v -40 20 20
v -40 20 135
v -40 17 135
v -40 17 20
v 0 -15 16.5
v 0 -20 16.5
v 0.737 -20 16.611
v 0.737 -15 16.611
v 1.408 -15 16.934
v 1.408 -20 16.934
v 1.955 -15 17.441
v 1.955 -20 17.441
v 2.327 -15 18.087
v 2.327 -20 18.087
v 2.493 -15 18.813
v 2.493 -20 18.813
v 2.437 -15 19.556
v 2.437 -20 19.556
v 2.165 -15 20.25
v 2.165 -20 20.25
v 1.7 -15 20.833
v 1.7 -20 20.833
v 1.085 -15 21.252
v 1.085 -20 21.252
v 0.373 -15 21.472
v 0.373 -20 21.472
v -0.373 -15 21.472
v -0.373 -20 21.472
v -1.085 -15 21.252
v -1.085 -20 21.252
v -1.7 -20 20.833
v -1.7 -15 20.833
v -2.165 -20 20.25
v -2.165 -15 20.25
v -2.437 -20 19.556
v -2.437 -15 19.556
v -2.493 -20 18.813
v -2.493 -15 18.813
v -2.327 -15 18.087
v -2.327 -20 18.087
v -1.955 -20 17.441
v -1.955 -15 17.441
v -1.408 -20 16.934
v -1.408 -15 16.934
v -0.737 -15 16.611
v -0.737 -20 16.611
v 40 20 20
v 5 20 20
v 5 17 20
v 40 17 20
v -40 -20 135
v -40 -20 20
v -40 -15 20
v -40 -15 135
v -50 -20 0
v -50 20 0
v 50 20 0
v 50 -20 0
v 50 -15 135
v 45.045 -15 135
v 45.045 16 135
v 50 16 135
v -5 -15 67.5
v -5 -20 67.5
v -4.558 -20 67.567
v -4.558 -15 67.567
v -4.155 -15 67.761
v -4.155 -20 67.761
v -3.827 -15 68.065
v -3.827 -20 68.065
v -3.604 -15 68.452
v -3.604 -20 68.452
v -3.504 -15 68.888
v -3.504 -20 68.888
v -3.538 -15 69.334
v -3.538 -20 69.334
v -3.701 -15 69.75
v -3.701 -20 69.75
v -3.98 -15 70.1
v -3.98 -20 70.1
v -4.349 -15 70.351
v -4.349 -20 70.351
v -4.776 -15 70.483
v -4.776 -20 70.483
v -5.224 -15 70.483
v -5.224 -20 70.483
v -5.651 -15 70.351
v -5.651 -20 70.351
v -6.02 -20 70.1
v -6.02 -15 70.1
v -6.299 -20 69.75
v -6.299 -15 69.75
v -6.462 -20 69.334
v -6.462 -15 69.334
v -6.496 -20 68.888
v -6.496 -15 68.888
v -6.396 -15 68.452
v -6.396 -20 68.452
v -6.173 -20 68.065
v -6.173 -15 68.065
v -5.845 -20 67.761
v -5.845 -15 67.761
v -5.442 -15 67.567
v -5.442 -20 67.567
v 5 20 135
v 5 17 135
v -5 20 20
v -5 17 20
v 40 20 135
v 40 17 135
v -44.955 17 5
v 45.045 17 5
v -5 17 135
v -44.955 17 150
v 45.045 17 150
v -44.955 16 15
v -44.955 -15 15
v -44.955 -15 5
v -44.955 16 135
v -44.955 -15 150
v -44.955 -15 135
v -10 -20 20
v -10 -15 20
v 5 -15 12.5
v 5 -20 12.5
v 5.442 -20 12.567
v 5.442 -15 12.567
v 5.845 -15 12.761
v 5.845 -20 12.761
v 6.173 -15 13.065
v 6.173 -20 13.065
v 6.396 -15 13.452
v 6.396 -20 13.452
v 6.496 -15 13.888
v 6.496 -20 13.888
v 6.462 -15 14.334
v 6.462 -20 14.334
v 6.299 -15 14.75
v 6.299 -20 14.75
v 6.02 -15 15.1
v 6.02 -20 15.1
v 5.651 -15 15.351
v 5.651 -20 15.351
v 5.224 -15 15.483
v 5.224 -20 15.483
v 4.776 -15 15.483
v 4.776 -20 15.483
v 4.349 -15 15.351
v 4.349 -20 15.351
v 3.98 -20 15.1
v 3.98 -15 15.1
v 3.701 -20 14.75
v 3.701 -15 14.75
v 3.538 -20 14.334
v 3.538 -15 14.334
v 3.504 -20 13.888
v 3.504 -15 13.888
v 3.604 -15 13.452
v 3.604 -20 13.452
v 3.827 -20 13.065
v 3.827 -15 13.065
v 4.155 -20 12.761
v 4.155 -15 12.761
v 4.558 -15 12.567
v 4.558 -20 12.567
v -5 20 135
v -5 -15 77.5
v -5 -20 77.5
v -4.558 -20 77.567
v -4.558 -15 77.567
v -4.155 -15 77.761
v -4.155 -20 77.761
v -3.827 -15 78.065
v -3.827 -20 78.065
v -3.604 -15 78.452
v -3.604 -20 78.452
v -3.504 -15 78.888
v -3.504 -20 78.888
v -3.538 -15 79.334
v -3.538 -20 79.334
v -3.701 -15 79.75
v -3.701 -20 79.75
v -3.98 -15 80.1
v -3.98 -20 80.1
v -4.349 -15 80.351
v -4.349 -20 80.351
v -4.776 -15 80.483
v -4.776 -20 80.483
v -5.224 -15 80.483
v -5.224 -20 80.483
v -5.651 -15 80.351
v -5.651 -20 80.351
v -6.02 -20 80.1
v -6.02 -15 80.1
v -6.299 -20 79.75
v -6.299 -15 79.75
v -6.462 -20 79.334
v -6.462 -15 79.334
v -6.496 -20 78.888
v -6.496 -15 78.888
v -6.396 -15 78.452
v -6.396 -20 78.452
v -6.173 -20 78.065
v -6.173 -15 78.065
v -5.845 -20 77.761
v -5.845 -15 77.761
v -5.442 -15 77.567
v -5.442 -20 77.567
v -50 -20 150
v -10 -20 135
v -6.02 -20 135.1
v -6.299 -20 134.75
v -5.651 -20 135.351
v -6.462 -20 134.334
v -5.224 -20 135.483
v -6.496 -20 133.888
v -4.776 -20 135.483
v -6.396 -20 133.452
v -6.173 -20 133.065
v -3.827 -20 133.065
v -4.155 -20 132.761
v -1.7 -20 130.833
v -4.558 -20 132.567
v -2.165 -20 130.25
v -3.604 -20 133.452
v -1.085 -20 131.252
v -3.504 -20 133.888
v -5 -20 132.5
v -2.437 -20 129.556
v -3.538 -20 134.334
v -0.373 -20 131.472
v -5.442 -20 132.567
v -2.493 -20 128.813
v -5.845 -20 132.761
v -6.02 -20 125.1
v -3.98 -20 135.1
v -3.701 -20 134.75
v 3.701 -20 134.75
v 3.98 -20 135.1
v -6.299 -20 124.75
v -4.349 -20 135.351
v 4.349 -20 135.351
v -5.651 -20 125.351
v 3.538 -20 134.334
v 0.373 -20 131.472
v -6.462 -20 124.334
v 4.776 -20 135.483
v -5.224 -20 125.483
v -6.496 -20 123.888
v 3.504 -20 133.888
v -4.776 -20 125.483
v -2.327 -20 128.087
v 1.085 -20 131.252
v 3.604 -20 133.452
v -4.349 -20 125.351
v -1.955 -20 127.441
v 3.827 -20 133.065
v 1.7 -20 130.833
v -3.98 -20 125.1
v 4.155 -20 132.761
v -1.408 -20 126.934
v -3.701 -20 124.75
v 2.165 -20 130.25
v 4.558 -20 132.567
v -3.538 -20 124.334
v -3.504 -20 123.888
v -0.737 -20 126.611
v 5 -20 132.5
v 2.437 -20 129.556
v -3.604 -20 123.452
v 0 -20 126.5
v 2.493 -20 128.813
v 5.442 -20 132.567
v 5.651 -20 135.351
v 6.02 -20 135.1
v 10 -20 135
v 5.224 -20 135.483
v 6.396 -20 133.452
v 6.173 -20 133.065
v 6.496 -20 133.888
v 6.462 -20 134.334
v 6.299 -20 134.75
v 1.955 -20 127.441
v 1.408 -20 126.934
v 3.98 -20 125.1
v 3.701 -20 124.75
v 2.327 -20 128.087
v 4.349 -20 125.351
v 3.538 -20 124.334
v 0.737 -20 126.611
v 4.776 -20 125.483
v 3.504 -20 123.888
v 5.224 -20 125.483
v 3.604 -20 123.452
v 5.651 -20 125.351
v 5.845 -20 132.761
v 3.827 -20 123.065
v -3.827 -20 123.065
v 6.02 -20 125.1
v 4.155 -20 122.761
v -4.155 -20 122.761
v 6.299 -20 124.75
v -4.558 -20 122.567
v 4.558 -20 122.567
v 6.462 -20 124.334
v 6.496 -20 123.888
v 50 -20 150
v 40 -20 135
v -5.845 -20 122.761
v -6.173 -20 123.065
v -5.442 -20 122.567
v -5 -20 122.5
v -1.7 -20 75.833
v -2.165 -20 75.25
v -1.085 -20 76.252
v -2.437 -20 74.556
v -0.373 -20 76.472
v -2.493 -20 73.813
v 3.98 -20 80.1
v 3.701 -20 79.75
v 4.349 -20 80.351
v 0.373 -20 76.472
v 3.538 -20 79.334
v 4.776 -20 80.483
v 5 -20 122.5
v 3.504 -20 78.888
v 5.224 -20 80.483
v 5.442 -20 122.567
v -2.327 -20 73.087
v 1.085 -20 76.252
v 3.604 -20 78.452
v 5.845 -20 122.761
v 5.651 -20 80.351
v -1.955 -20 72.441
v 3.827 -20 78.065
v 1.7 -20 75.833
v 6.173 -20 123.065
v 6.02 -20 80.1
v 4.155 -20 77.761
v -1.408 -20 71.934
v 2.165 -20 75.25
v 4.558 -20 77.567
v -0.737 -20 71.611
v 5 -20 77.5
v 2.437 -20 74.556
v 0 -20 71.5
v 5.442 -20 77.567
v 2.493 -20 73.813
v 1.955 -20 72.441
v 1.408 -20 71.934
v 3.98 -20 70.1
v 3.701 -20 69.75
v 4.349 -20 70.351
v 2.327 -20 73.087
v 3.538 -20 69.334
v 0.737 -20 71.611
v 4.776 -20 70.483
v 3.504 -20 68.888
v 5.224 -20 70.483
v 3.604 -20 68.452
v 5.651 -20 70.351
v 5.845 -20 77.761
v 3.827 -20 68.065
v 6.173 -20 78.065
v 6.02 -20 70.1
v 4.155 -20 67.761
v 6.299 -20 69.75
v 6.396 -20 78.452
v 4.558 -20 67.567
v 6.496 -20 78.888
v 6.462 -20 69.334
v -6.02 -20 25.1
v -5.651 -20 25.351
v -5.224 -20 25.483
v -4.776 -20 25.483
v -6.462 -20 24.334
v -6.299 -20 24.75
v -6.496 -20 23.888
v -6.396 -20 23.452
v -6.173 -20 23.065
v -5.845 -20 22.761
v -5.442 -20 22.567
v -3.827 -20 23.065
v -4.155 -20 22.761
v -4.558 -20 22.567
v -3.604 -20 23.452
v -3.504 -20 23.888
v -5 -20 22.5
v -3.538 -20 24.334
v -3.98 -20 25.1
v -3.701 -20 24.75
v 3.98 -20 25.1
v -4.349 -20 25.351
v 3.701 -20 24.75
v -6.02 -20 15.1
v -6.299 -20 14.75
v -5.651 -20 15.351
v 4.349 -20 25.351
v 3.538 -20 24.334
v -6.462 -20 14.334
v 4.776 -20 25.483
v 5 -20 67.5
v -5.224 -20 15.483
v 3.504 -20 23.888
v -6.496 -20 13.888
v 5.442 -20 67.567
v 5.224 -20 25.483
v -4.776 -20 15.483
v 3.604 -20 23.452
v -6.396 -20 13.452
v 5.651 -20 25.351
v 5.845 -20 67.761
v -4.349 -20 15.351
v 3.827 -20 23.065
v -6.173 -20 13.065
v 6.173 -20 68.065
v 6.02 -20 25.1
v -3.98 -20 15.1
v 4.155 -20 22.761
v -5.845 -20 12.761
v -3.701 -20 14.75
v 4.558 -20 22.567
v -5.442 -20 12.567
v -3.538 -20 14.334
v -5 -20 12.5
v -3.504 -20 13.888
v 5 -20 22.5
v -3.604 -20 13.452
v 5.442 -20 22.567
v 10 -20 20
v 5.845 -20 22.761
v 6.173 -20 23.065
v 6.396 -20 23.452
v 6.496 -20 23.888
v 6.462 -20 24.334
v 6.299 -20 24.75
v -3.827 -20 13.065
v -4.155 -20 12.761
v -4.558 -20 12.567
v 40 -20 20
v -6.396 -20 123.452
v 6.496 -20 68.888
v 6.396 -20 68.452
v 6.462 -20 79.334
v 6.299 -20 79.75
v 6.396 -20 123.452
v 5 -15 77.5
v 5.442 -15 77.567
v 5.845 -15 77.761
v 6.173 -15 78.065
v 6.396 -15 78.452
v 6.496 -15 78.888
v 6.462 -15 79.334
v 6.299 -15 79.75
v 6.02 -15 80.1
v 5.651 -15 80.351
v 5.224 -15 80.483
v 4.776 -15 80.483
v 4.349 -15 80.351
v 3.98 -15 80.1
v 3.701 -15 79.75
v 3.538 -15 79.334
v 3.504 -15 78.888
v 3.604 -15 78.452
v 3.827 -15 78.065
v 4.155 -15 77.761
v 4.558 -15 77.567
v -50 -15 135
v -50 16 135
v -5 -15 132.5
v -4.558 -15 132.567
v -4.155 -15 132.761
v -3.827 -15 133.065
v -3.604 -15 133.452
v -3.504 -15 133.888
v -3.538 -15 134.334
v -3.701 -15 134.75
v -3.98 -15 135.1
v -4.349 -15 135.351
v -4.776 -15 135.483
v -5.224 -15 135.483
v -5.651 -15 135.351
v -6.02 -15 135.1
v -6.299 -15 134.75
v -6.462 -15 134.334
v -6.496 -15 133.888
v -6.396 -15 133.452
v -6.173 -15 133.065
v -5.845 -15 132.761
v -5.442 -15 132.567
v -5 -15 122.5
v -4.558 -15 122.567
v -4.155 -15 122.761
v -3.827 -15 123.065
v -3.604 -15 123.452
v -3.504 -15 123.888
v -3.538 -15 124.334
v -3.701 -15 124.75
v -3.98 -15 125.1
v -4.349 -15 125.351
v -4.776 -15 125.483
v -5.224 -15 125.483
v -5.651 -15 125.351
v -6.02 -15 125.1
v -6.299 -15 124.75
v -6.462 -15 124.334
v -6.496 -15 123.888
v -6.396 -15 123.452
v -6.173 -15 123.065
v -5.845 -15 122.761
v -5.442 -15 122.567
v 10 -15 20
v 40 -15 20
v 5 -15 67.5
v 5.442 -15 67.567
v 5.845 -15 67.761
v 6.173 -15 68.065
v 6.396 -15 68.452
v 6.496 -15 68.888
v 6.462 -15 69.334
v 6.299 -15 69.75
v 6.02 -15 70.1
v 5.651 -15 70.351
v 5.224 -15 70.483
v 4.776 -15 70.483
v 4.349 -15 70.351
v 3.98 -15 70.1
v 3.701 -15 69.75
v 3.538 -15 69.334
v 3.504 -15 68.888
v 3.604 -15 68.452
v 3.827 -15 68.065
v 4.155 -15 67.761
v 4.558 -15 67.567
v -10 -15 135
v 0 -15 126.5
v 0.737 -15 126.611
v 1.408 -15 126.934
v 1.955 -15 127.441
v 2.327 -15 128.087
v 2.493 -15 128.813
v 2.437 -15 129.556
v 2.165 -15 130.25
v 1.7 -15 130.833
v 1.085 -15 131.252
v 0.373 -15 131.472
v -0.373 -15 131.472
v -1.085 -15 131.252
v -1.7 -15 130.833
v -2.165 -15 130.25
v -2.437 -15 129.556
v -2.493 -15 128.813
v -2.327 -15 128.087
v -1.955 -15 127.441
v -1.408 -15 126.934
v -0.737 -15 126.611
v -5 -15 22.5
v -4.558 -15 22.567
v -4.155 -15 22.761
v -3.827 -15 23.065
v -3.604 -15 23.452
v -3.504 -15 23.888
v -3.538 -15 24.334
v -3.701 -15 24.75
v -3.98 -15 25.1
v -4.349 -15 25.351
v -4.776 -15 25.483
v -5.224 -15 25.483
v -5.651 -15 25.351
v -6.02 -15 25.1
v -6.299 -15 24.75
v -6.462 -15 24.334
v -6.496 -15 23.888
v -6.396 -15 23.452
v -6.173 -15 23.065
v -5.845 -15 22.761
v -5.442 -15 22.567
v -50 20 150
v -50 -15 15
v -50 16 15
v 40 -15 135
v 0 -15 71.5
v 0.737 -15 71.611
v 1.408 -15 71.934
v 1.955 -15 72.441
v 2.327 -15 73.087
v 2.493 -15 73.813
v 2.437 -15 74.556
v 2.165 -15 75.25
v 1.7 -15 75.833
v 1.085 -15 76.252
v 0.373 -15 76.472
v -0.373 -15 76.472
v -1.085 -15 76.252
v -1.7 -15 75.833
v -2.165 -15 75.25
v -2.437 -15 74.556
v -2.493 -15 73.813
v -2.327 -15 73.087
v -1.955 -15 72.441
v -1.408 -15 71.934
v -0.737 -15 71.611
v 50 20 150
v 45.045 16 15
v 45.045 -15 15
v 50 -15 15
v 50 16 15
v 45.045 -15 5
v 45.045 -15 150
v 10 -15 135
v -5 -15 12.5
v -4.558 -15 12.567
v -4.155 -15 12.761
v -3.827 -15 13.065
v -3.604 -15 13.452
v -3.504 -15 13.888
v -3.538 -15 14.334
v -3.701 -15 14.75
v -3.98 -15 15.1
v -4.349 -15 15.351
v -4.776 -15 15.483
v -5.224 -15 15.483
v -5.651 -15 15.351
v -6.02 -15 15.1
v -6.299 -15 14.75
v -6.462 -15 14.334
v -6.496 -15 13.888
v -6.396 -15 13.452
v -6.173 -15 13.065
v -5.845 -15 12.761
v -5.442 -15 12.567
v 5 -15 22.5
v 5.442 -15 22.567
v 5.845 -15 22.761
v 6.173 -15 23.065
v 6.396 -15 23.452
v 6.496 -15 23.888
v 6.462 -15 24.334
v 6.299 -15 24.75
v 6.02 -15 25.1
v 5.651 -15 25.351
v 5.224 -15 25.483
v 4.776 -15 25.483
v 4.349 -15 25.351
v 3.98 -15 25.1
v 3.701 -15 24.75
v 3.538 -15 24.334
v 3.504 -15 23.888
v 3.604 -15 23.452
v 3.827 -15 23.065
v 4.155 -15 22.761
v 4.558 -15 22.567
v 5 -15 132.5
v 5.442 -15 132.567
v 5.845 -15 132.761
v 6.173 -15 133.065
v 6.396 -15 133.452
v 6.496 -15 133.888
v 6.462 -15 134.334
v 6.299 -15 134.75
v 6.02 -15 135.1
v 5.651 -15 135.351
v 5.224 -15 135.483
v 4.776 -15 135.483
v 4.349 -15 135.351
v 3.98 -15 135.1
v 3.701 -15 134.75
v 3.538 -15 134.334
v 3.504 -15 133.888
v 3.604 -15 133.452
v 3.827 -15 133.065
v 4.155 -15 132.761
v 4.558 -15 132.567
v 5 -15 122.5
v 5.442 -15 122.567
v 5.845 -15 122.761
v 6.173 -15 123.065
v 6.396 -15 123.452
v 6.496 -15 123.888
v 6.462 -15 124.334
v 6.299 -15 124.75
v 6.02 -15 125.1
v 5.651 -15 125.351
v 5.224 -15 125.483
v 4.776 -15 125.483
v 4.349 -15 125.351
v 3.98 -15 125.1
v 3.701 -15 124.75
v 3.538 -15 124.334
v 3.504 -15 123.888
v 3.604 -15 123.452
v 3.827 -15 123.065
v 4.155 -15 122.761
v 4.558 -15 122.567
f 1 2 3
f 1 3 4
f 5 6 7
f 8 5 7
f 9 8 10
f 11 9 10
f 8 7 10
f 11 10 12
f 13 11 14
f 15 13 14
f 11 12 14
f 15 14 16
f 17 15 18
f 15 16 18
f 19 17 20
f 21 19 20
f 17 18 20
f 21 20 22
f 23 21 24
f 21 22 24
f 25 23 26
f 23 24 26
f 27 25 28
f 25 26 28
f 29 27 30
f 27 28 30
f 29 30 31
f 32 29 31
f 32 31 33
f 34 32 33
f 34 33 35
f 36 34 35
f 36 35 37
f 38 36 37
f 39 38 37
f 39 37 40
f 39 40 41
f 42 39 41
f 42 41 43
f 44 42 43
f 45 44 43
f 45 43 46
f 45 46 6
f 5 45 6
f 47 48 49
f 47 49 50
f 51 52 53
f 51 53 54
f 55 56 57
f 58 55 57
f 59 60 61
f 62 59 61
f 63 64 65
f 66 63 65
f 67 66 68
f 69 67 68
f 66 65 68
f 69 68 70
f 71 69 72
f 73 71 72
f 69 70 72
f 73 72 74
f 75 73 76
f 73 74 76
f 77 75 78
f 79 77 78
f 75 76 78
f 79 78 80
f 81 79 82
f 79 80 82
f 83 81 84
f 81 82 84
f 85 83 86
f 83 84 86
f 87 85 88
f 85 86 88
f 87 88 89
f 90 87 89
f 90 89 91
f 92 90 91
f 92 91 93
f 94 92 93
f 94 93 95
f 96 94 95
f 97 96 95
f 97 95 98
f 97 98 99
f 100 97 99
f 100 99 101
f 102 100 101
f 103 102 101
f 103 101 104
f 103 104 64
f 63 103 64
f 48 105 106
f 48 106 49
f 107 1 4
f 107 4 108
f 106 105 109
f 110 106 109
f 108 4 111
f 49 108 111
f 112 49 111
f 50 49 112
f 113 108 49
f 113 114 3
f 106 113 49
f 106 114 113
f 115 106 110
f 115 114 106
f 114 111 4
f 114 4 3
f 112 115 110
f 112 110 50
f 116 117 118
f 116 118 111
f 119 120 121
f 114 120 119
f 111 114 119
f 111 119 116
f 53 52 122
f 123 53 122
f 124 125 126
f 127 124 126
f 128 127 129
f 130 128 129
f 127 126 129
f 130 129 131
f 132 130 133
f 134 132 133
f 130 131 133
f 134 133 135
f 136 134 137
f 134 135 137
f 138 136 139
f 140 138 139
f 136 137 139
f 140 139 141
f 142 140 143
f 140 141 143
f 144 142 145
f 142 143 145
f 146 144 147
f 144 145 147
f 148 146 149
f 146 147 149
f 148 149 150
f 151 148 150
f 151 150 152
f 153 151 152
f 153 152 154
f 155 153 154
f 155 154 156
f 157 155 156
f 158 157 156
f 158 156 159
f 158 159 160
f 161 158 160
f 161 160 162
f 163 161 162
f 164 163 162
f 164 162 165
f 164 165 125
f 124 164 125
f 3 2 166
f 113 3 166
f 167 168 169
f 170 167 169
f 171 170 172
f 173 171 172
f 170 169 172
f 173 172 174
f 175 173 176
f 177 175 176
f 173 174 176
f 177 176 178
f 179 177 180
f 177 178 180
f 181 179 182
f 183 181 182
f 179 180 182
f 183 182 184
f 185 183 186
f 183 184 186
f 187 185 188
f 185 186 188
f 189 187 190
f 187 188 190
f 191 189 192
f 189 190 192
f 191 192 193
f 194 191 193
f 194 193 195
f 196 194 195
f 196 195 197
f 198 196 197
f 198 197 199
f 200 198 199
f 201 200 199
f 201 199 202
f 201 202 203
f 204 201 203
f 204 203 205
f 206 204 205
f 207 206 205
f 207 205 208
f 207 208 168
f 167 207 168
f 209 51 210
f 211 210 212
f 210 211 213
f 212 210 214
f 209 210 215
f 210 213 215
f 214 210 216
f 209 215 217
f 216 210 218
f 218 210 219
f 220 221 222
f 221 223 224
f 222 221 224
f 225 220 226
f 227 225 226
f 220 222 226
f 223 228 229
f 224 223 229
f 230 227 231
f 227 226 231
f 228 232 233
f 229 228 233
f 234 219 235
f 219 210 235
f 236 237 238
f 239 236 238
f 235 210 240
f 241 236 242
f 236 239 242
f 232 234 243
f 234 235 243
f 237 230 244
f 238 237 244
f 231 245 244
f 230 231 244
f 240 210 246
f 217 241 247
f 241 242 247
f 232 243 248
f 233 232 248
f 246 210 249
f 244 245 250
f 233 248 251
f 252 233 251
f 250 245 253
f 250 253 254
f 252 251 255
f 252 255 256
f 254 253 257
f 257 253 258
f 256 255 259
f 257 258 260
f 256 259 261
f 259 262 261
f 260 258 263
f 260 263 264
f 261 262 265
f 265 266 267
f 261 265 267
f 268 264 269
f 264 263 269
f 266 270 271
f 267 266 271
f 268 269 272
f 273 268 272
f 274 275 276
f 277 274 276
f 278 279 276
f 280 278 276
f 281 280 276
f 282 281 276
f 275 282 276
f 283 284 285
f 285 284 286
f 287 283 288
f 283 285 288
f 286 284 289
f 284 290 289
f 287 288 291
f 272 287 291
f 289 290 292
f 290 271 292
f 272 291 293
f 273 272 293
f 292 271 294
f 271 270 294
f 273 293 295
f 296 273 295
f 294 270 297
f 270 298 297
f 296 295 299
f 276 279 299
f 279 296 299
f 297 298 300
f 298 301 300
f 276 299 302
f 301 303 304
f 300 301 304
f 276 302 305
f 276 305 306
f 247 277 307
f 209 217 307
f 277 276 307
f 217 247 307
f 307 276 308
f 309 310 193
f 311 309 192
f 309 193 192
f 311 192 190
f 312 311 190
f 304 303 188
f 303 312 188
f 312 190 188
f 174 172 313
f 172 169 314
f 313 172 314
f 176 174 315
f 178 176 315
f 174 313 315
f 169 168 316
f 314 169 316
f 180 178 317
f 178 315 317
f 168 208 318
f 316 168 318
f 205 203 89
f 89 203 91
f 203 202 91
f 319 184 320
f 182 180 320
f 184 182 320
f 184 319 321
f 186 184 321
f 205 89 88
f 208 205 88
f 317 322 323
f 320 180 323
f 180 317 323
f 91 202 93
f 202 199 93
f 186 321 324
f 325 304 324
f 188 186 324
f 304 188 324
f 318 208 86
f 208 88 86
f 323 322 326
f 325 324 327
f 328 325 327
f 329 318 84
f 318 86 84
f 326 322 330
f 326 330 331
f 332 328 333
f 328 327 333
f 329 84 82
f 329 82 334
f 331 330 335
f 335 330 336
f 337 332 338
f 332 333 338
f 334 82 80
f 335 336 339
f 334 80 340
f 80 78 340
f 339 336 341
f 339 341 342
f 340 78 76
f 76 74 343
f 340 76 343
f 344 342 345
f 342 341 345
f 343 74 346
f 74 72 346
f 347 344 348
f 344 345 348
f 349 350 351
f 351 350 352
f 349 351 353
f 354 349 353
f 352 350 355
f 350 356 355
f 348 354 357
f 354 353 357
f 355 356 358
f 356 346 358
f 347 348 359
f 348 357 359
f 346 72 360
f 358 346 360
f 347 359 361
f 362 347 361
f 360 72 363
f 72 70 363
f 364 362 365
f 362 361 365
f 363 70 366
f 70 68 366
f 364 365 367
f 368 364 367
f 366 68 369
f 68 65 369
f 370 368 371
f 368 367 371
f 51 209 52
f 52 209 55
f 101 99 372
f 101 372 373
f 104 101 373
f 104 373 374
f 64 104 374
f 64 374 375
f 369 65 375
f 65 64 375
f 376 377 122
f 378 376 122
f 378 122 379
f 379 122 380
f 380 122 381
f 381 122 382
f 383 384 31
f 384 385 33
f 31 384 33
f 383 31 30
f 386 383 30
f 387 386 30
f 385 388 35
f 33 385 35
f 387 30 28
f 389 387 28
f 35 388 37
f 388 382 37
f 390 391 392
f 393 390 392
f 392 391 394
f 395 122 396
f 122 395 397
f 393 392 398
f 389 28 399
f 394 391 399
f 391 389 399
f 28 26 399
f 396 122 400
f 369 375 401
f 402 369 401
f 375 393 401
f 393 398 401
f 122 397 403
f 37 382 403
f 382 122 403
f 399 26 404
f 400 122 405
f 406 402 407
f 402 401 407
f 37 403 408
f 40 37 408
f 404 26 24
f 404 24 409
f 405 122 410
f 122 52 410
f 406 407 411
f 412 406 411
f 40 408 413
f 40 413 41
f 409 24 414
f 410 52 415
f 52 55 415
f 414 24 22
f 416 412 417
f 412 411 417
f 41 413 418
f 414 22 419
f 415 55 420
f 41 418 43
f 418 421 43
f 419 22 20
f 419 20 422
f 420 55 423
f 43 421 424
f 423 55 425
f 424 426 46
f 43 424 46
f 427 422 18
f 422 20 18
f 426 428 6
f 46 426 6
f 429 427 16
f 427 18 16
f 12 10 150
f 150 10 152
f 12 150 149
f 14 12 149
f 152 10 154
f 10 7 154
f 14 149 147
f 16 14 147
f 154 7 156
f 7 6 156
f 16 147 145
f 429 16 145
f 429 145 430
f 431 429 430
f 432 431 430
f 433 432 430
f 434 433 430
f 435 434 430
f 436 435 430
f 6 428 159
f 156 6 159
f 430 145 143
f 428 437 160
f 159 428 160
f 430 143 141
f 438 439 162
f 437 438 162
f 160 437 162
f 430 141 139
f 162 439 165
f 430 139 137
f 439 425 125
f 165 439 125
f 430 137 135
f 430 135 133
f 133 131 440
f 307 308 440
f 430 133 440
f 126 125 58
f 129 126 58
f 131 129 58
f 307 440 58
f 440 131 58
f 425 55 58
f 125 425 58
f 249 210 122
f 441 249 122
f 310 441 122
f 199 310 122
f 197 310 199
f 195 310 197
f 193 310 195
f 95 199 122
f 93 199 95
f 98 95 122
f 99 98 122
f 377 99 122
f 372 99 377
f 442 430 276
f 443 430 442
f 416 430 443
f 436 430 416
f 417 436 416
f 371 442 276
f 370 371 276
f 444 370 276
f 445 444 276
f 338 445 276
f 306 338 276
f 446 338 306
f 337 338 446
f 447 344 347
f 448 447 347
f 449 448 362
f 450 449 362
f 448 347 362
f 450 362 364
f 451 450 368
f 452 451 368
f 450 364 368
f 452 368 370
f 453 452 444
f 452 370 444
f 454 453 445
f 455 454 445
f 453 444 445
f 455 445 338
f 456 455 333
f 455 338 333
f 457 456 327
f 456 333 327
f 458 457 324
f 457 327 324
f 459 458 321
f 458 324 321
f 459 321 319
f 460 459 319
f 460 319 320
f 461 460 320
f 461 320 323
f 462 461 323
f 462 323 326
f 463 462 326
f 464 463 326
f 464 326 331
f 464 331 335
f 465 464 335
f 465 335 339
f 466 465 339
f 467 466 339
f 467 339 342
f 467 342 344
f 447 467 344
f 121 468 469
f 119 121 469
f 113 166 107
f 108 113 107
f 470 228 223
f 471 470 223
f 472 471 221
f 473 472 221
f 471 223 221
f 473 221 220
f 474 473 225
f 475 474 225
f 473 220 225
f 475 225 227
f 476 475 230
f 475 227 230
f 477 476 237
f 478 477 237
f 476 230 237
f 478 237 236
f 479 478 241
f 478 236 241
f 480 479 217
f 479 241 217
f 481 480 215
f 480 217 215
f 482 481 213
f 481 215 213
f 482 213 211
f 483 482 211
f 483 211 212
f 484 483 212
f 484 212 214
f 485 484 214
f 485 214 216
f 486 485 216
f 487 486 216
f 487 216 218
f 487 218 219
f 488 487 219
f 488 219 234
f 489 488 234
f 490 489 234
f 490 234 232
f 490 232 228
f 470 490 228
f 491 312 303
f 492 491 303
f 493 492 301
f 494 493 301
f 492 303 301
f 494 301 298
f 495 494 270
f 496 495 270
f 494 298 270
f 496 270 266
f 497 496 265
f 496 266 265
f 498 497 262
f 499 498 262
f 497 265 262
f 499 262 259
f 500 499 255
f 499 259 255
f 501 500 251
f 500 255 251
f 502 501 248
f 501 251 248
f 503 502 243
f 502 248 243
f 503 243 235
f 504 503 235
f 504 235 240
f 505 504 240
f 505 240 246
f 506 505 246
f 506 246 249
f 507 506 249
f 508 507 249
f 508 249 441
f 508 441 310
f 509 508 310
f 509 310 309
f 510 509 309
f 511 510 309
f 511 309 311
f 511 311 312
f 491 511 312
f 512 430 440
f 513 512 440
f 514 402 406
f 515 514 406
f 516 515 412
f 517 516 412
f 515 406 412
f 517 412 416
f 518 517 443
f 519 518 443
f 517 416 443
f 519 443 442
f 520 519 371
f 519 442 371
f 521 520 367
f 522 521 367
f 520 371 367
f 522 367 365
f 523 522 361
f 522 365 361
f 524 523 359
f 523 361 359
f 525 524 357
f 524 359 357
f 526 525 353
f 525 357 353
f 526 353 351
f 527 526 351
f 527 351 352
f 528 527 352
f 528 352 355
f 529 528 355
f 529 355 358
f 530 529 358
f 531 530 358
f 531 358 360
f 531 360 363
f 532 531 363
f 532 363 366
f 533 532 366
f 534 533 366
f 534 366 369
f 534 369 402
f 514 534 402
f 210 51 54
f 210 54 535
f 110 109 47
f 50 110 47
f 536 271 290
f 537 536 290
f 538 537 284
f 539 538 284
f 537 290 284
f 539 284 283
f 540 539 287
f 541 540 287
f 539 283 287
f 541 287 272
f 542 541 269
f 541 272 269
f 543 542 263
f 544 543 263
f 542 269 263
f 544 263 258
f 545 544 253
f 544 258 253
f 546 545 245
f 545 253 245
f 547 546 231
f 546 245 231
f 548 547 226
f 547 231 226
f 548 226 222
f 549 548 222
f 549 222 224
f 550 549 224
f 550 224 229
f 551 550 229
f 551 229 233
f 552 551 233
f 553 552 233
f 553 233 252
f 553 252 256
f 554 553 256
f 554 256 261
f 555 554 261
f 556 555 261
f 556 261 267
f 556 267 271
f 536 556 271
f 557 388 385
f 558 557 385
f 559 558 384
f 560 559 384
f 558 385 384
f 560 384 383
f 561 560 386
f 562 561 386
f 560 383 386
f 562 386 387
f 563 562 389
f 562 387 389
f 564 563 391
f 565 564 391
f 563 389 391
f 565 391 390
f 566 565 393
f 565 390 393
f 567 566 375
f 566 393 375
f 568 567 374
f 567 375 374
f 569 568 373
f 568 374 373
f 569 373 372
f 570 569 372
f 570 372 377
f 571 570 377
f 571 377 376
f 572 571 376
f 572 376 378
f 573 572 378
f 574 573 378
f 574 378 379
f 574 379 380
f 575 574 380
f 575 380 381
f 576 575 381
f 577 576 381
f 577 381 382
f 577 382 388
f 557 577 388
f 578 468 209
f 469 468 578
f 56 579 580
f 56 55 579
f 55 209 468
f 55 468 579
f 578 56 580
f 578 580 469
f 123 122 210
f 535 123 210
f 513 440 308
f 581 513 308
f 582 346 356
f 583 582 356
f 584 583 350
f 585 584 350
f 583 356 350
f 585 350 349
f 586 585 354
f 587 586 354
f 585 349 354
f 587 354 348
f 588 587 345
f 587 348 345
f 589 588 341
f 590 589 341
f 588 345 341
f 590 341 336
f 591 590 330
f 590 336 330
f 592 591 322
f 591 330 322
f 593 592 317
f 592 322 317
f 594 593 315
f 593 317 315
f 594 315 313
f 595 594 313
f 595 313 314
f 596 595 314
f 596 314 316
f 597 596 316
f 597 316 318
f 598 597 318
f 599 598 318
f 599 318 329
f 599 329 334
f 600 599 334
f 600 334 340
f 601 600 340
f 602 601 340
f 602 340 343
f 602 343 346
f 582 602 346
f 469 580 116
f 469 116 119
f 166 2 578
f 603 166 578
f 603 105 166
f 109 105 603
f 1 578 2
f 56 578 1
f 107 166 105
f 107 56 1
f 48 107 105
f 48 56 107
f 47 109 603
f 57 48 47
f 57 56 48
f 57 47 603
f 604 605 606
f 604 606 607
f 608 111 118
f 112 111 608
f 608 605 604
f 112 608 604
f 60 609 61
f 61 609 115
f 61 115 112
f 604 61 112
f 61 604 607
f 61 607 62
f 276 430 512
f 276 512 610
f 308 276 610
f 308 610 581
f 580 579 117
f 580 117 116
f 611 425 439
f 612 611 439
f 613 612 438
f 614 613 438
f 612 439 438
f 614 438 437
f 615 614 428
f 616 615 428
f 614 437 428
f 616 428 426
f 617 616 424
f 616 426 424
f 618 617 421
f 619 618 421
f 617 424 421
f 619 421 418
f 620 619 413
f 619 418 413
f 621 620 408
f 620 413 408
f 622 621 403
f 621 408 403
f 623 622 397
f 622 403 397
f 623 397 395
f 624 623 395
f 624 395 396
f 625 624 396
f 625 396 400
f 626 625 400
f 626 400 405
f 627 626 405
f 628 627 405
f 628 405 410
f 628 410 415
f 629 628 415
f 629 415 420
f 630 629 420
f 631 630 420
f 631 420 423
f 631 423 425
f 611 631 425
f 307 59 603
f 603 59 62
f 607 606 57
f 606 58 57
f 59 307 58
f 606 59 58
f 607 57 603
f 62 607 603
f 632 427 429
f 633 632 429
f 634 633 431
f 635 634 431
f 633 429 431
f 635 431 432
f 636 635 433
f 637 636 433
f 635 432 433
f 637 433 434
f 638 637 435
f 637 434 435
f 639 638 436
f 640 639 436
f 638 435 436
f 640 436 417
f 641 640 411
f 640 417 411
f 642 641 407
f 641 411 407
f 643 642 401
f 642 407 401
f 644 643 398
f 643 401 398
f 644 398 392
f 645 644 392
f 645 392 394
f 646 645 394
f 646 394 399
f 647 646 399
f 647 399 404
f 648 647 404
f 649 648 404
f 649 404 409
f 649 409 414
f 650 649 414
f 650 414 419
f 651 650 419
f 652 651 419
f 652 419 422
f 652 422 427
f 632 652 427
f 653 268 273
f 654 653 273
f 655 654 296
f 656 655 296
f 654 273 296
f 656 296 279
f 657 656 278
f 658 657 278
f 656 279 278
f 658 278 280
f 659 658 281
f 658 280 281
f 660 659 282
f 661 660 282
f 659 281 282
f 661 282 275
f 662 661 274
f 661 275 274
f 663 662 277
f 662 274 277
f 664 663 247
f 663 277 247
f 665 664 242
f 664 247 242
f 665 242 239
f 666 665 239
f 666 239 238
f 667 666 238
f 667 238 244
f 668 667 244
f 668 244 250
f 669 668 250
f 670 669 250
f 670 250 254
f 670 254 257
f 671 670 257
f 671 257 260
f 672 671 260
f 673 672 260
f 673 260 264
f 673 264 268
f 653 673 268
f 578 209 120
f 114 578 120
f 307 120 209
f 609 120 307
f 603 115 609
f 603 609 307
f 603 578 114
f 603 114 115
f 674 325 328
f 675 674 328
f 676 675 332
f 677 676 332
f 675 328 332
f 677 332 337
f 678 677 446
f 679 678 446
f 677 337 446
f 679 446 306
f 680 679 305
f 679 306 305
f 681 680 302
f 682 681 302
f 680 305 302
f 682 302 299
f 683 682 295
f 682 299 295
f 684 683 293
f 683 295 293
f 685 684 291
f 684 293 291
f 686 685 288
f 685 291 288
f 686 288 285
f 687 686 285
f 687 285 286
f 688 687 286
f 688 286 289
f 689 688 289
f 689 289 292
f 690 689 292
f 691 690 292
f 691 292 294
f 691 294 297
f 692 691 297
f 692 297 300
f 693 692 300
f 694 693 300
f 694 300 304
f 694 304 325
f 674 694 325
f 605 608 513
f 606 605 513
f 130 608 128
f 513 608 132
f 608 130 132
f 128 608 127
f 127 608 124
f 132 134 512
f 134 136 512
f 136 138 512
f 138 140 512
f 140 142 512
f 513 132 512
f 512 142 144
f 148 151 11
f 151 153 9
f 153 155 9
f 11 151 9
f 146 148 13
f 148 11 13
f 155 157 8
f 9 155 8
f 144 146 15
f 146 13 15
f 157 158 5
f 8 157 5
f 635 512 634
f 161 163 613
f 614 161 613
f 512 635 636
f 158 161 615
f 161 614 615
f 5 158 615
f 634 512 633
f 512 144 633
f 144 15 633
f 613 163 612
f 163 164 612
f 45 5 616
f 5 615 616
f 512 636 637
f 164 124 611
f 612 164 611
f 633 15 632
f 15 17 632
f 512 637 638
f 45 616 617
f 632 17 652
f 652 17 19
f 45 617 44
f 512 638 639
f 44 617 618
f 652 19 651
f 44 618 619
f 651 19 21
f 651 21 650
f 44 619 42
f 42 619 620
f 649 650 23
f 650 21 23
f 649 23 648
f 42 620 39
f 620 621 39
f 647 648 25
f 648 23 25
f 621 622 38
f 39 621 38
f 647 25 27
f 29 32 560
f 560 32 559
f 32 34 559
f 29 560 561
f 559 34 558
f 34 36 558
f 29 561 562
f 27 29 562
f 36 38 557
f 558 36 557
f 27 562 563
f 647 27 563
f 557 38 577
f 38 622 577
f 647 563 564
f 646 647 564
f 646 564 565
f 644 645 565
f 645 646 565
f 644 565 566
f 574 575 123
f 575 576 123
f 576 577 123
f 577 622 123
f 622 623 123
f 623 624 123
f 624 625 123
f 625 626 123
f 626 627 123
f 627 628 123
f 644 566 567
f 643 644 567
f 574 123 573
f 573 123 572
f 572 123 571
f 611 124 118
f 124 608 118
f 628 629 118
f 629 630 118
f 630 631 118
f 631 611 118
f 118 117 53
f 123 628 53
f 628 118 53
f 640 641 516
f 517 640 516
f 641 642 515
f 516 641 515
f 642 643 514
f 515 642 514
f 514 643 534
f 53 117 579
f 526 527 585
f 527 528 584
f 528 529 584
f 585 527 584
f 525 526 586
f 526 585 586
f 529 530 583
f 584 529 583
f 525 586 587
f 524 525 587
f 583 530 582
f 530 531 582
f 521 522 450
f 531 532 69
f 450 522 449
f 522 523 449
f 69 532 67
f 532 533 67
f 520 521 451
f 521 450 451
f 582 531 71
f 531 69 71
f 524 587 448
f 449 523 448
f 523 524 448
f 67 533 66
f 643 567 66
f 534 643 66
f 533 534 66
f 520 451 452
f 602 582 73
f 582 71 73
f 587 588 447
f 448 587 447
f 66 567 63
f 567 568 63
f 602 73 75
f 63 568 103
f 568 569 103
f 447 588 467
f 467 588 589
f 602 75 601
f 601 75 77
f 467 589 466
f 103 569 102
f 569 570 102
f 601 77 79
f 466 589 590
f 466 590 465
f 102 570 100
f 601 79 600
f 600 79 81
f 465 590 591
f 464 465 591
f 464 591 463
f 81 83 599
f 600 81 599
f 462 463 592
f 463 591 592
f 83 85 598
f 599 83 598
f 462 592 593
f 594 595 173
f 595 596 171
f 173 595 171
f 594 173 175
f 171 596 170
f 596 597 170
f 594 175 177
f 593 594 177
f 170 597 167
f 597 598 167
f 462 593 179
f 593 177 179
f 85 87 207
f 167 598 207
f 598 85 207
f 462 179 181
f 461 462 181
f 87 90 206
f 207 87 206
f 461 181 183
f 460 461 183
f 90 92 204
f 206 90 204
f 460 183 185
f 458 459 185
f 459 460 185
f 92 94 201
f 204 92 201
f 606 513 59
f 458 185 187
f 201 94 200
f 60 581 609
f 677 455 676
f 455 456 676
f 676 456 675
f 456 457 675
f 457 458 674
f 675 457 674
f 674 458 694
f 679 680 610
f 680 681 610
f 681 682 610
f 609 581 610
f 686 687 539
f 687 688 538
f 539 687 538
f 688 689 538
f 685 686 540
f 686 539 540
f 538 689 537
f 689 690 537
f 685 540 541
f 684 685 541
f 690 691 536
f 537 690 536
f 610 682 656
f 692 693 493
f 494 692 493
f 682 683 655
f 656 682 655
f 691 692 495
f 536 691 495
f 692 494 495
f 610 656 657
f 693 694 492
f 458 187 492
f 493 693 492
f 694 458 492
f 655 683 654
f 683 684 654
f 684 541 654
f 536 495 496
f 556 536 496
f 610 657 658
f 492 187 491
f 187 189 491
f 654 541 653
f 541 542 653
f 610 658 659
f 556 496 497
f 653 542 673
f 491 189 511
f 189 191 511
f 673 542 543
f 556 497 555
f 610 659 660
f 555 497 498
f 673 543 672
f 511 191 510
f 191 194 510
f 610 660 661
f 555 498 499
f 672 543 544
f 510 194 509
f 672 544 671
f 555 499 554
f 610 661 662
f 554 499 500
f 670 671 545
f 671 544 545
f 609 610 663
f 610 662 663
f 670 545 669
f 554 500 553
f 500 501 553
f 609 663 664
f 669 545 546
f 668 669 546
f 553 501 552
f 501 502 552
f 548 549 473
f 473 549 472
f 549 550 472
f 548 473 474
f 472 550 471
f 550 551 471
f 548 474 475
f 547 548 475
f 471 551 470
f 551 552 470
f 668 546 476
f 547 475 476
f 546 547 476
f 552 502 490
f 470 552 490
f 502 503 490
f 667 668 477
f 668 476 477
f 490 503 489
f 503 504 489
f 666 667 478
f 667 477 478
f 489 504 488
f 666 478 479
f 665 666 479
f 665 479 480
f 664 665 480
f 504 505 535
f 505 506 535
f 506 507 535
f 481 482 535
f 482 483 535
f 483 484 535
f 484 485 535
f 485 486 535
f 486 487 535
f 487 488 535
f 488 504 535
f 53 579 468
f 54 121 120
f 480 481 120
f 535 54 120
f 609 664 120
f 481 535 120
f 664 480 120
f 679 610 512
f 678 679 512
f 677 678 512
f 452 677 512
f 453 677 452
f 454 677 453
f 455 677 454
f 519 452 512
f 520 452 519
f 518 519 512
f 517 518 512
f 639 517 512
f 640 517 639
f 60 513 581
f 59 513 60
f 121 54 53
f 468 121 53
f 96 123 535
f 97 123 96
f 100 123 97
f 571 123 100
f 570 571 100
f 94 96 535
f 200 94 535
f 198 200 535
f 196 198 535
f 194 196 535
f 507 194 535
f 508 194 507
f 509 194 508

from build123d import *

# Parameters (mm, degrees)
SKETCH_2_W          = 100
SKETCH_2_H          = 40
EXTRUDE_1_DEPTH     = 150
SKETCH_3_W          = 90
SKETCH_3_H          = 32
CUT_EXTRUDE_1_DEPTH = 145
SKETCH_4_W          = 30
SKETCH_4_H          = 115
CUT_EXTRUDE_2_DEPTH = 20
SKETCH_5_W          = 35
SKETCH_5_H          = 115
CUT_EXTRUDE_3_DEPTH = 20
SKETCH_6_W          = 120
SKETCH_6_H          = 31
CUT_EXTRUDE_4_DEPTH = 207
SKETCH_7_R          = 1.5
CUT_EXTRUDE_5_DEPTH = 15
SKETCH_8_R          = 2.5
SKETCH_8_R_2        = 1.5
CUT_EXTRUDE_6_DEPTH = 15


with BuildPart() as part:
    # 草图2 → 凸台-拉伸1 (new body)
    with BuildSketch(Plane.XY):
        Rectangle(SKETCH_2_W, SKETCH_2_H)
    extrude(amount=EXTRUDE_1_DEPTH)

    # 草图3 → 切除-拉伸1 (cut)
    with BuildSketch(Plane.XY.offset(150)):
        with Locations((0.044588489, 1)):
            Rectangle(SKETCH_3_W, SKETCH_3_H)
    extrude(amount=-CUT_EXTRUDE_1_DEPTH, mode=Mode.SUBTRACT)

    # 草图4 → 切除-拉伸2 (cut)
    with BuildSketch(Plane.XZ.offset(20)):
        with Locations((-25, 77.5)):
            Rectangle(SKETCH_4_W, SKETCH_4_H)
        with Locations((25, 77.5)):
            Rectangle(SKETCH_4_W, SKETCH_4_H)
    extrude(amount=-CUT_EXTRUDE_2_DEPTH, mode=Mode.SUBTRACT)

    # 草图5 → 切除-拉伸3 (cut)
    with BuildSketch(Plane(origin=(0, 20, 0), x_dir=(1, 0, 0), z_dir=(0, 1, 0))):
        with Locations((-22.5, -77.5)):
            Rectangle(SKETCH_5_W, SKETCH_5_H)
        with Locations((22.5, -77.5)):
            Rectangle(SKETCH_5_W, SKETCH_5_H)
    extrude(amount=-CUT_EXTRUDE_3_DEPTH, mode=Mode.SUBTRACT)

    # 草图6 → 切除-拉伸4 (cut)
    with BuildSketch(Plane.ZY.offset(50)):
        with Locations((75, 0.5)):
            Rectangle(SKETCH_6_W, SKETCH_6_H)
    extrude(amount=-CUT_EXTRUDE_4_DEPTH, mode=Mode.SUBTRACT)

    # 草图7 → 切除-拉伸5 (cut)
    with BuildSketch(Plane.XZ.offset(20)):
        with Locations(Location((-5, 134, 0), (0, 0, 270))):
            Circle(SKETCH_7_R)
        with Locations(Location((5, 134, 0), (0, 0, 270))):
            Circle(SKETCH_7_R)
        with Locations(Location((5, 124, 0), (0, 0, 270))):
            Circle(SKETCH_7_R)
        with Locations(Location((-5, 124, 0), (0, 0, 270))):
            Circle(SKETCH_7_R)
    extrude(amount=-CUT_EXTRUDE_5_DEPTH, mode=Mode.SUBTRACT)

    # 草图8 → 切除-拉伸6 (cut)
    with BuildSketch(Plane.XZ.offset(20)):
        with Locations(Location((0, 129, 0), (0, 0, 270))):
            Circle(SKETCH_8_R)
        with Locations(Location((0, 74, 0), (0, 0, 270))):
            Circle(SKETCH_8_R)
        with Locations(Location((0, 19, 0), (0, 0, 270))):
            Circle(SKETCH_8_R)
        with Locations(Location((-5, 79, 0), (0, 0, 270))):
            Circle(SKETCH_8_R_2)
        with Locations(Location((-5, 69, 0), (0, 0, 270))):
            Circle(SKETCH_8_R_2)
        with Locations(Location((5, 69, 0), (0, 0, 270))):
            Circle(SKETCH_8_R_2)
        with Locations(Location((5, 79, 0), (0, 0, 270))):
            Circle(SKETCH_8_R_2)
        with Locations(Location((-5, 14, 0), (0, 0, 270))):
            Circle(SKETCH_8_R_2)
        with Locations(Location((-5, 24, 0), (0, 0, 270))):
            Circle(SKETCH_8_R_2)
        with Locations(Location((5, 24, 0), (0, 0, 270))):
            Circle(SKETCH_8_R_2)
        with Locations(Location((5, 14, 0), (0, 0, 270))):
            Circle(SKETCH_8_R_2)
    extrude(amount=-CUT_EXTRUDE_6_DEPTH, mode=Mode.SUBTRACT)


solid = part.part
